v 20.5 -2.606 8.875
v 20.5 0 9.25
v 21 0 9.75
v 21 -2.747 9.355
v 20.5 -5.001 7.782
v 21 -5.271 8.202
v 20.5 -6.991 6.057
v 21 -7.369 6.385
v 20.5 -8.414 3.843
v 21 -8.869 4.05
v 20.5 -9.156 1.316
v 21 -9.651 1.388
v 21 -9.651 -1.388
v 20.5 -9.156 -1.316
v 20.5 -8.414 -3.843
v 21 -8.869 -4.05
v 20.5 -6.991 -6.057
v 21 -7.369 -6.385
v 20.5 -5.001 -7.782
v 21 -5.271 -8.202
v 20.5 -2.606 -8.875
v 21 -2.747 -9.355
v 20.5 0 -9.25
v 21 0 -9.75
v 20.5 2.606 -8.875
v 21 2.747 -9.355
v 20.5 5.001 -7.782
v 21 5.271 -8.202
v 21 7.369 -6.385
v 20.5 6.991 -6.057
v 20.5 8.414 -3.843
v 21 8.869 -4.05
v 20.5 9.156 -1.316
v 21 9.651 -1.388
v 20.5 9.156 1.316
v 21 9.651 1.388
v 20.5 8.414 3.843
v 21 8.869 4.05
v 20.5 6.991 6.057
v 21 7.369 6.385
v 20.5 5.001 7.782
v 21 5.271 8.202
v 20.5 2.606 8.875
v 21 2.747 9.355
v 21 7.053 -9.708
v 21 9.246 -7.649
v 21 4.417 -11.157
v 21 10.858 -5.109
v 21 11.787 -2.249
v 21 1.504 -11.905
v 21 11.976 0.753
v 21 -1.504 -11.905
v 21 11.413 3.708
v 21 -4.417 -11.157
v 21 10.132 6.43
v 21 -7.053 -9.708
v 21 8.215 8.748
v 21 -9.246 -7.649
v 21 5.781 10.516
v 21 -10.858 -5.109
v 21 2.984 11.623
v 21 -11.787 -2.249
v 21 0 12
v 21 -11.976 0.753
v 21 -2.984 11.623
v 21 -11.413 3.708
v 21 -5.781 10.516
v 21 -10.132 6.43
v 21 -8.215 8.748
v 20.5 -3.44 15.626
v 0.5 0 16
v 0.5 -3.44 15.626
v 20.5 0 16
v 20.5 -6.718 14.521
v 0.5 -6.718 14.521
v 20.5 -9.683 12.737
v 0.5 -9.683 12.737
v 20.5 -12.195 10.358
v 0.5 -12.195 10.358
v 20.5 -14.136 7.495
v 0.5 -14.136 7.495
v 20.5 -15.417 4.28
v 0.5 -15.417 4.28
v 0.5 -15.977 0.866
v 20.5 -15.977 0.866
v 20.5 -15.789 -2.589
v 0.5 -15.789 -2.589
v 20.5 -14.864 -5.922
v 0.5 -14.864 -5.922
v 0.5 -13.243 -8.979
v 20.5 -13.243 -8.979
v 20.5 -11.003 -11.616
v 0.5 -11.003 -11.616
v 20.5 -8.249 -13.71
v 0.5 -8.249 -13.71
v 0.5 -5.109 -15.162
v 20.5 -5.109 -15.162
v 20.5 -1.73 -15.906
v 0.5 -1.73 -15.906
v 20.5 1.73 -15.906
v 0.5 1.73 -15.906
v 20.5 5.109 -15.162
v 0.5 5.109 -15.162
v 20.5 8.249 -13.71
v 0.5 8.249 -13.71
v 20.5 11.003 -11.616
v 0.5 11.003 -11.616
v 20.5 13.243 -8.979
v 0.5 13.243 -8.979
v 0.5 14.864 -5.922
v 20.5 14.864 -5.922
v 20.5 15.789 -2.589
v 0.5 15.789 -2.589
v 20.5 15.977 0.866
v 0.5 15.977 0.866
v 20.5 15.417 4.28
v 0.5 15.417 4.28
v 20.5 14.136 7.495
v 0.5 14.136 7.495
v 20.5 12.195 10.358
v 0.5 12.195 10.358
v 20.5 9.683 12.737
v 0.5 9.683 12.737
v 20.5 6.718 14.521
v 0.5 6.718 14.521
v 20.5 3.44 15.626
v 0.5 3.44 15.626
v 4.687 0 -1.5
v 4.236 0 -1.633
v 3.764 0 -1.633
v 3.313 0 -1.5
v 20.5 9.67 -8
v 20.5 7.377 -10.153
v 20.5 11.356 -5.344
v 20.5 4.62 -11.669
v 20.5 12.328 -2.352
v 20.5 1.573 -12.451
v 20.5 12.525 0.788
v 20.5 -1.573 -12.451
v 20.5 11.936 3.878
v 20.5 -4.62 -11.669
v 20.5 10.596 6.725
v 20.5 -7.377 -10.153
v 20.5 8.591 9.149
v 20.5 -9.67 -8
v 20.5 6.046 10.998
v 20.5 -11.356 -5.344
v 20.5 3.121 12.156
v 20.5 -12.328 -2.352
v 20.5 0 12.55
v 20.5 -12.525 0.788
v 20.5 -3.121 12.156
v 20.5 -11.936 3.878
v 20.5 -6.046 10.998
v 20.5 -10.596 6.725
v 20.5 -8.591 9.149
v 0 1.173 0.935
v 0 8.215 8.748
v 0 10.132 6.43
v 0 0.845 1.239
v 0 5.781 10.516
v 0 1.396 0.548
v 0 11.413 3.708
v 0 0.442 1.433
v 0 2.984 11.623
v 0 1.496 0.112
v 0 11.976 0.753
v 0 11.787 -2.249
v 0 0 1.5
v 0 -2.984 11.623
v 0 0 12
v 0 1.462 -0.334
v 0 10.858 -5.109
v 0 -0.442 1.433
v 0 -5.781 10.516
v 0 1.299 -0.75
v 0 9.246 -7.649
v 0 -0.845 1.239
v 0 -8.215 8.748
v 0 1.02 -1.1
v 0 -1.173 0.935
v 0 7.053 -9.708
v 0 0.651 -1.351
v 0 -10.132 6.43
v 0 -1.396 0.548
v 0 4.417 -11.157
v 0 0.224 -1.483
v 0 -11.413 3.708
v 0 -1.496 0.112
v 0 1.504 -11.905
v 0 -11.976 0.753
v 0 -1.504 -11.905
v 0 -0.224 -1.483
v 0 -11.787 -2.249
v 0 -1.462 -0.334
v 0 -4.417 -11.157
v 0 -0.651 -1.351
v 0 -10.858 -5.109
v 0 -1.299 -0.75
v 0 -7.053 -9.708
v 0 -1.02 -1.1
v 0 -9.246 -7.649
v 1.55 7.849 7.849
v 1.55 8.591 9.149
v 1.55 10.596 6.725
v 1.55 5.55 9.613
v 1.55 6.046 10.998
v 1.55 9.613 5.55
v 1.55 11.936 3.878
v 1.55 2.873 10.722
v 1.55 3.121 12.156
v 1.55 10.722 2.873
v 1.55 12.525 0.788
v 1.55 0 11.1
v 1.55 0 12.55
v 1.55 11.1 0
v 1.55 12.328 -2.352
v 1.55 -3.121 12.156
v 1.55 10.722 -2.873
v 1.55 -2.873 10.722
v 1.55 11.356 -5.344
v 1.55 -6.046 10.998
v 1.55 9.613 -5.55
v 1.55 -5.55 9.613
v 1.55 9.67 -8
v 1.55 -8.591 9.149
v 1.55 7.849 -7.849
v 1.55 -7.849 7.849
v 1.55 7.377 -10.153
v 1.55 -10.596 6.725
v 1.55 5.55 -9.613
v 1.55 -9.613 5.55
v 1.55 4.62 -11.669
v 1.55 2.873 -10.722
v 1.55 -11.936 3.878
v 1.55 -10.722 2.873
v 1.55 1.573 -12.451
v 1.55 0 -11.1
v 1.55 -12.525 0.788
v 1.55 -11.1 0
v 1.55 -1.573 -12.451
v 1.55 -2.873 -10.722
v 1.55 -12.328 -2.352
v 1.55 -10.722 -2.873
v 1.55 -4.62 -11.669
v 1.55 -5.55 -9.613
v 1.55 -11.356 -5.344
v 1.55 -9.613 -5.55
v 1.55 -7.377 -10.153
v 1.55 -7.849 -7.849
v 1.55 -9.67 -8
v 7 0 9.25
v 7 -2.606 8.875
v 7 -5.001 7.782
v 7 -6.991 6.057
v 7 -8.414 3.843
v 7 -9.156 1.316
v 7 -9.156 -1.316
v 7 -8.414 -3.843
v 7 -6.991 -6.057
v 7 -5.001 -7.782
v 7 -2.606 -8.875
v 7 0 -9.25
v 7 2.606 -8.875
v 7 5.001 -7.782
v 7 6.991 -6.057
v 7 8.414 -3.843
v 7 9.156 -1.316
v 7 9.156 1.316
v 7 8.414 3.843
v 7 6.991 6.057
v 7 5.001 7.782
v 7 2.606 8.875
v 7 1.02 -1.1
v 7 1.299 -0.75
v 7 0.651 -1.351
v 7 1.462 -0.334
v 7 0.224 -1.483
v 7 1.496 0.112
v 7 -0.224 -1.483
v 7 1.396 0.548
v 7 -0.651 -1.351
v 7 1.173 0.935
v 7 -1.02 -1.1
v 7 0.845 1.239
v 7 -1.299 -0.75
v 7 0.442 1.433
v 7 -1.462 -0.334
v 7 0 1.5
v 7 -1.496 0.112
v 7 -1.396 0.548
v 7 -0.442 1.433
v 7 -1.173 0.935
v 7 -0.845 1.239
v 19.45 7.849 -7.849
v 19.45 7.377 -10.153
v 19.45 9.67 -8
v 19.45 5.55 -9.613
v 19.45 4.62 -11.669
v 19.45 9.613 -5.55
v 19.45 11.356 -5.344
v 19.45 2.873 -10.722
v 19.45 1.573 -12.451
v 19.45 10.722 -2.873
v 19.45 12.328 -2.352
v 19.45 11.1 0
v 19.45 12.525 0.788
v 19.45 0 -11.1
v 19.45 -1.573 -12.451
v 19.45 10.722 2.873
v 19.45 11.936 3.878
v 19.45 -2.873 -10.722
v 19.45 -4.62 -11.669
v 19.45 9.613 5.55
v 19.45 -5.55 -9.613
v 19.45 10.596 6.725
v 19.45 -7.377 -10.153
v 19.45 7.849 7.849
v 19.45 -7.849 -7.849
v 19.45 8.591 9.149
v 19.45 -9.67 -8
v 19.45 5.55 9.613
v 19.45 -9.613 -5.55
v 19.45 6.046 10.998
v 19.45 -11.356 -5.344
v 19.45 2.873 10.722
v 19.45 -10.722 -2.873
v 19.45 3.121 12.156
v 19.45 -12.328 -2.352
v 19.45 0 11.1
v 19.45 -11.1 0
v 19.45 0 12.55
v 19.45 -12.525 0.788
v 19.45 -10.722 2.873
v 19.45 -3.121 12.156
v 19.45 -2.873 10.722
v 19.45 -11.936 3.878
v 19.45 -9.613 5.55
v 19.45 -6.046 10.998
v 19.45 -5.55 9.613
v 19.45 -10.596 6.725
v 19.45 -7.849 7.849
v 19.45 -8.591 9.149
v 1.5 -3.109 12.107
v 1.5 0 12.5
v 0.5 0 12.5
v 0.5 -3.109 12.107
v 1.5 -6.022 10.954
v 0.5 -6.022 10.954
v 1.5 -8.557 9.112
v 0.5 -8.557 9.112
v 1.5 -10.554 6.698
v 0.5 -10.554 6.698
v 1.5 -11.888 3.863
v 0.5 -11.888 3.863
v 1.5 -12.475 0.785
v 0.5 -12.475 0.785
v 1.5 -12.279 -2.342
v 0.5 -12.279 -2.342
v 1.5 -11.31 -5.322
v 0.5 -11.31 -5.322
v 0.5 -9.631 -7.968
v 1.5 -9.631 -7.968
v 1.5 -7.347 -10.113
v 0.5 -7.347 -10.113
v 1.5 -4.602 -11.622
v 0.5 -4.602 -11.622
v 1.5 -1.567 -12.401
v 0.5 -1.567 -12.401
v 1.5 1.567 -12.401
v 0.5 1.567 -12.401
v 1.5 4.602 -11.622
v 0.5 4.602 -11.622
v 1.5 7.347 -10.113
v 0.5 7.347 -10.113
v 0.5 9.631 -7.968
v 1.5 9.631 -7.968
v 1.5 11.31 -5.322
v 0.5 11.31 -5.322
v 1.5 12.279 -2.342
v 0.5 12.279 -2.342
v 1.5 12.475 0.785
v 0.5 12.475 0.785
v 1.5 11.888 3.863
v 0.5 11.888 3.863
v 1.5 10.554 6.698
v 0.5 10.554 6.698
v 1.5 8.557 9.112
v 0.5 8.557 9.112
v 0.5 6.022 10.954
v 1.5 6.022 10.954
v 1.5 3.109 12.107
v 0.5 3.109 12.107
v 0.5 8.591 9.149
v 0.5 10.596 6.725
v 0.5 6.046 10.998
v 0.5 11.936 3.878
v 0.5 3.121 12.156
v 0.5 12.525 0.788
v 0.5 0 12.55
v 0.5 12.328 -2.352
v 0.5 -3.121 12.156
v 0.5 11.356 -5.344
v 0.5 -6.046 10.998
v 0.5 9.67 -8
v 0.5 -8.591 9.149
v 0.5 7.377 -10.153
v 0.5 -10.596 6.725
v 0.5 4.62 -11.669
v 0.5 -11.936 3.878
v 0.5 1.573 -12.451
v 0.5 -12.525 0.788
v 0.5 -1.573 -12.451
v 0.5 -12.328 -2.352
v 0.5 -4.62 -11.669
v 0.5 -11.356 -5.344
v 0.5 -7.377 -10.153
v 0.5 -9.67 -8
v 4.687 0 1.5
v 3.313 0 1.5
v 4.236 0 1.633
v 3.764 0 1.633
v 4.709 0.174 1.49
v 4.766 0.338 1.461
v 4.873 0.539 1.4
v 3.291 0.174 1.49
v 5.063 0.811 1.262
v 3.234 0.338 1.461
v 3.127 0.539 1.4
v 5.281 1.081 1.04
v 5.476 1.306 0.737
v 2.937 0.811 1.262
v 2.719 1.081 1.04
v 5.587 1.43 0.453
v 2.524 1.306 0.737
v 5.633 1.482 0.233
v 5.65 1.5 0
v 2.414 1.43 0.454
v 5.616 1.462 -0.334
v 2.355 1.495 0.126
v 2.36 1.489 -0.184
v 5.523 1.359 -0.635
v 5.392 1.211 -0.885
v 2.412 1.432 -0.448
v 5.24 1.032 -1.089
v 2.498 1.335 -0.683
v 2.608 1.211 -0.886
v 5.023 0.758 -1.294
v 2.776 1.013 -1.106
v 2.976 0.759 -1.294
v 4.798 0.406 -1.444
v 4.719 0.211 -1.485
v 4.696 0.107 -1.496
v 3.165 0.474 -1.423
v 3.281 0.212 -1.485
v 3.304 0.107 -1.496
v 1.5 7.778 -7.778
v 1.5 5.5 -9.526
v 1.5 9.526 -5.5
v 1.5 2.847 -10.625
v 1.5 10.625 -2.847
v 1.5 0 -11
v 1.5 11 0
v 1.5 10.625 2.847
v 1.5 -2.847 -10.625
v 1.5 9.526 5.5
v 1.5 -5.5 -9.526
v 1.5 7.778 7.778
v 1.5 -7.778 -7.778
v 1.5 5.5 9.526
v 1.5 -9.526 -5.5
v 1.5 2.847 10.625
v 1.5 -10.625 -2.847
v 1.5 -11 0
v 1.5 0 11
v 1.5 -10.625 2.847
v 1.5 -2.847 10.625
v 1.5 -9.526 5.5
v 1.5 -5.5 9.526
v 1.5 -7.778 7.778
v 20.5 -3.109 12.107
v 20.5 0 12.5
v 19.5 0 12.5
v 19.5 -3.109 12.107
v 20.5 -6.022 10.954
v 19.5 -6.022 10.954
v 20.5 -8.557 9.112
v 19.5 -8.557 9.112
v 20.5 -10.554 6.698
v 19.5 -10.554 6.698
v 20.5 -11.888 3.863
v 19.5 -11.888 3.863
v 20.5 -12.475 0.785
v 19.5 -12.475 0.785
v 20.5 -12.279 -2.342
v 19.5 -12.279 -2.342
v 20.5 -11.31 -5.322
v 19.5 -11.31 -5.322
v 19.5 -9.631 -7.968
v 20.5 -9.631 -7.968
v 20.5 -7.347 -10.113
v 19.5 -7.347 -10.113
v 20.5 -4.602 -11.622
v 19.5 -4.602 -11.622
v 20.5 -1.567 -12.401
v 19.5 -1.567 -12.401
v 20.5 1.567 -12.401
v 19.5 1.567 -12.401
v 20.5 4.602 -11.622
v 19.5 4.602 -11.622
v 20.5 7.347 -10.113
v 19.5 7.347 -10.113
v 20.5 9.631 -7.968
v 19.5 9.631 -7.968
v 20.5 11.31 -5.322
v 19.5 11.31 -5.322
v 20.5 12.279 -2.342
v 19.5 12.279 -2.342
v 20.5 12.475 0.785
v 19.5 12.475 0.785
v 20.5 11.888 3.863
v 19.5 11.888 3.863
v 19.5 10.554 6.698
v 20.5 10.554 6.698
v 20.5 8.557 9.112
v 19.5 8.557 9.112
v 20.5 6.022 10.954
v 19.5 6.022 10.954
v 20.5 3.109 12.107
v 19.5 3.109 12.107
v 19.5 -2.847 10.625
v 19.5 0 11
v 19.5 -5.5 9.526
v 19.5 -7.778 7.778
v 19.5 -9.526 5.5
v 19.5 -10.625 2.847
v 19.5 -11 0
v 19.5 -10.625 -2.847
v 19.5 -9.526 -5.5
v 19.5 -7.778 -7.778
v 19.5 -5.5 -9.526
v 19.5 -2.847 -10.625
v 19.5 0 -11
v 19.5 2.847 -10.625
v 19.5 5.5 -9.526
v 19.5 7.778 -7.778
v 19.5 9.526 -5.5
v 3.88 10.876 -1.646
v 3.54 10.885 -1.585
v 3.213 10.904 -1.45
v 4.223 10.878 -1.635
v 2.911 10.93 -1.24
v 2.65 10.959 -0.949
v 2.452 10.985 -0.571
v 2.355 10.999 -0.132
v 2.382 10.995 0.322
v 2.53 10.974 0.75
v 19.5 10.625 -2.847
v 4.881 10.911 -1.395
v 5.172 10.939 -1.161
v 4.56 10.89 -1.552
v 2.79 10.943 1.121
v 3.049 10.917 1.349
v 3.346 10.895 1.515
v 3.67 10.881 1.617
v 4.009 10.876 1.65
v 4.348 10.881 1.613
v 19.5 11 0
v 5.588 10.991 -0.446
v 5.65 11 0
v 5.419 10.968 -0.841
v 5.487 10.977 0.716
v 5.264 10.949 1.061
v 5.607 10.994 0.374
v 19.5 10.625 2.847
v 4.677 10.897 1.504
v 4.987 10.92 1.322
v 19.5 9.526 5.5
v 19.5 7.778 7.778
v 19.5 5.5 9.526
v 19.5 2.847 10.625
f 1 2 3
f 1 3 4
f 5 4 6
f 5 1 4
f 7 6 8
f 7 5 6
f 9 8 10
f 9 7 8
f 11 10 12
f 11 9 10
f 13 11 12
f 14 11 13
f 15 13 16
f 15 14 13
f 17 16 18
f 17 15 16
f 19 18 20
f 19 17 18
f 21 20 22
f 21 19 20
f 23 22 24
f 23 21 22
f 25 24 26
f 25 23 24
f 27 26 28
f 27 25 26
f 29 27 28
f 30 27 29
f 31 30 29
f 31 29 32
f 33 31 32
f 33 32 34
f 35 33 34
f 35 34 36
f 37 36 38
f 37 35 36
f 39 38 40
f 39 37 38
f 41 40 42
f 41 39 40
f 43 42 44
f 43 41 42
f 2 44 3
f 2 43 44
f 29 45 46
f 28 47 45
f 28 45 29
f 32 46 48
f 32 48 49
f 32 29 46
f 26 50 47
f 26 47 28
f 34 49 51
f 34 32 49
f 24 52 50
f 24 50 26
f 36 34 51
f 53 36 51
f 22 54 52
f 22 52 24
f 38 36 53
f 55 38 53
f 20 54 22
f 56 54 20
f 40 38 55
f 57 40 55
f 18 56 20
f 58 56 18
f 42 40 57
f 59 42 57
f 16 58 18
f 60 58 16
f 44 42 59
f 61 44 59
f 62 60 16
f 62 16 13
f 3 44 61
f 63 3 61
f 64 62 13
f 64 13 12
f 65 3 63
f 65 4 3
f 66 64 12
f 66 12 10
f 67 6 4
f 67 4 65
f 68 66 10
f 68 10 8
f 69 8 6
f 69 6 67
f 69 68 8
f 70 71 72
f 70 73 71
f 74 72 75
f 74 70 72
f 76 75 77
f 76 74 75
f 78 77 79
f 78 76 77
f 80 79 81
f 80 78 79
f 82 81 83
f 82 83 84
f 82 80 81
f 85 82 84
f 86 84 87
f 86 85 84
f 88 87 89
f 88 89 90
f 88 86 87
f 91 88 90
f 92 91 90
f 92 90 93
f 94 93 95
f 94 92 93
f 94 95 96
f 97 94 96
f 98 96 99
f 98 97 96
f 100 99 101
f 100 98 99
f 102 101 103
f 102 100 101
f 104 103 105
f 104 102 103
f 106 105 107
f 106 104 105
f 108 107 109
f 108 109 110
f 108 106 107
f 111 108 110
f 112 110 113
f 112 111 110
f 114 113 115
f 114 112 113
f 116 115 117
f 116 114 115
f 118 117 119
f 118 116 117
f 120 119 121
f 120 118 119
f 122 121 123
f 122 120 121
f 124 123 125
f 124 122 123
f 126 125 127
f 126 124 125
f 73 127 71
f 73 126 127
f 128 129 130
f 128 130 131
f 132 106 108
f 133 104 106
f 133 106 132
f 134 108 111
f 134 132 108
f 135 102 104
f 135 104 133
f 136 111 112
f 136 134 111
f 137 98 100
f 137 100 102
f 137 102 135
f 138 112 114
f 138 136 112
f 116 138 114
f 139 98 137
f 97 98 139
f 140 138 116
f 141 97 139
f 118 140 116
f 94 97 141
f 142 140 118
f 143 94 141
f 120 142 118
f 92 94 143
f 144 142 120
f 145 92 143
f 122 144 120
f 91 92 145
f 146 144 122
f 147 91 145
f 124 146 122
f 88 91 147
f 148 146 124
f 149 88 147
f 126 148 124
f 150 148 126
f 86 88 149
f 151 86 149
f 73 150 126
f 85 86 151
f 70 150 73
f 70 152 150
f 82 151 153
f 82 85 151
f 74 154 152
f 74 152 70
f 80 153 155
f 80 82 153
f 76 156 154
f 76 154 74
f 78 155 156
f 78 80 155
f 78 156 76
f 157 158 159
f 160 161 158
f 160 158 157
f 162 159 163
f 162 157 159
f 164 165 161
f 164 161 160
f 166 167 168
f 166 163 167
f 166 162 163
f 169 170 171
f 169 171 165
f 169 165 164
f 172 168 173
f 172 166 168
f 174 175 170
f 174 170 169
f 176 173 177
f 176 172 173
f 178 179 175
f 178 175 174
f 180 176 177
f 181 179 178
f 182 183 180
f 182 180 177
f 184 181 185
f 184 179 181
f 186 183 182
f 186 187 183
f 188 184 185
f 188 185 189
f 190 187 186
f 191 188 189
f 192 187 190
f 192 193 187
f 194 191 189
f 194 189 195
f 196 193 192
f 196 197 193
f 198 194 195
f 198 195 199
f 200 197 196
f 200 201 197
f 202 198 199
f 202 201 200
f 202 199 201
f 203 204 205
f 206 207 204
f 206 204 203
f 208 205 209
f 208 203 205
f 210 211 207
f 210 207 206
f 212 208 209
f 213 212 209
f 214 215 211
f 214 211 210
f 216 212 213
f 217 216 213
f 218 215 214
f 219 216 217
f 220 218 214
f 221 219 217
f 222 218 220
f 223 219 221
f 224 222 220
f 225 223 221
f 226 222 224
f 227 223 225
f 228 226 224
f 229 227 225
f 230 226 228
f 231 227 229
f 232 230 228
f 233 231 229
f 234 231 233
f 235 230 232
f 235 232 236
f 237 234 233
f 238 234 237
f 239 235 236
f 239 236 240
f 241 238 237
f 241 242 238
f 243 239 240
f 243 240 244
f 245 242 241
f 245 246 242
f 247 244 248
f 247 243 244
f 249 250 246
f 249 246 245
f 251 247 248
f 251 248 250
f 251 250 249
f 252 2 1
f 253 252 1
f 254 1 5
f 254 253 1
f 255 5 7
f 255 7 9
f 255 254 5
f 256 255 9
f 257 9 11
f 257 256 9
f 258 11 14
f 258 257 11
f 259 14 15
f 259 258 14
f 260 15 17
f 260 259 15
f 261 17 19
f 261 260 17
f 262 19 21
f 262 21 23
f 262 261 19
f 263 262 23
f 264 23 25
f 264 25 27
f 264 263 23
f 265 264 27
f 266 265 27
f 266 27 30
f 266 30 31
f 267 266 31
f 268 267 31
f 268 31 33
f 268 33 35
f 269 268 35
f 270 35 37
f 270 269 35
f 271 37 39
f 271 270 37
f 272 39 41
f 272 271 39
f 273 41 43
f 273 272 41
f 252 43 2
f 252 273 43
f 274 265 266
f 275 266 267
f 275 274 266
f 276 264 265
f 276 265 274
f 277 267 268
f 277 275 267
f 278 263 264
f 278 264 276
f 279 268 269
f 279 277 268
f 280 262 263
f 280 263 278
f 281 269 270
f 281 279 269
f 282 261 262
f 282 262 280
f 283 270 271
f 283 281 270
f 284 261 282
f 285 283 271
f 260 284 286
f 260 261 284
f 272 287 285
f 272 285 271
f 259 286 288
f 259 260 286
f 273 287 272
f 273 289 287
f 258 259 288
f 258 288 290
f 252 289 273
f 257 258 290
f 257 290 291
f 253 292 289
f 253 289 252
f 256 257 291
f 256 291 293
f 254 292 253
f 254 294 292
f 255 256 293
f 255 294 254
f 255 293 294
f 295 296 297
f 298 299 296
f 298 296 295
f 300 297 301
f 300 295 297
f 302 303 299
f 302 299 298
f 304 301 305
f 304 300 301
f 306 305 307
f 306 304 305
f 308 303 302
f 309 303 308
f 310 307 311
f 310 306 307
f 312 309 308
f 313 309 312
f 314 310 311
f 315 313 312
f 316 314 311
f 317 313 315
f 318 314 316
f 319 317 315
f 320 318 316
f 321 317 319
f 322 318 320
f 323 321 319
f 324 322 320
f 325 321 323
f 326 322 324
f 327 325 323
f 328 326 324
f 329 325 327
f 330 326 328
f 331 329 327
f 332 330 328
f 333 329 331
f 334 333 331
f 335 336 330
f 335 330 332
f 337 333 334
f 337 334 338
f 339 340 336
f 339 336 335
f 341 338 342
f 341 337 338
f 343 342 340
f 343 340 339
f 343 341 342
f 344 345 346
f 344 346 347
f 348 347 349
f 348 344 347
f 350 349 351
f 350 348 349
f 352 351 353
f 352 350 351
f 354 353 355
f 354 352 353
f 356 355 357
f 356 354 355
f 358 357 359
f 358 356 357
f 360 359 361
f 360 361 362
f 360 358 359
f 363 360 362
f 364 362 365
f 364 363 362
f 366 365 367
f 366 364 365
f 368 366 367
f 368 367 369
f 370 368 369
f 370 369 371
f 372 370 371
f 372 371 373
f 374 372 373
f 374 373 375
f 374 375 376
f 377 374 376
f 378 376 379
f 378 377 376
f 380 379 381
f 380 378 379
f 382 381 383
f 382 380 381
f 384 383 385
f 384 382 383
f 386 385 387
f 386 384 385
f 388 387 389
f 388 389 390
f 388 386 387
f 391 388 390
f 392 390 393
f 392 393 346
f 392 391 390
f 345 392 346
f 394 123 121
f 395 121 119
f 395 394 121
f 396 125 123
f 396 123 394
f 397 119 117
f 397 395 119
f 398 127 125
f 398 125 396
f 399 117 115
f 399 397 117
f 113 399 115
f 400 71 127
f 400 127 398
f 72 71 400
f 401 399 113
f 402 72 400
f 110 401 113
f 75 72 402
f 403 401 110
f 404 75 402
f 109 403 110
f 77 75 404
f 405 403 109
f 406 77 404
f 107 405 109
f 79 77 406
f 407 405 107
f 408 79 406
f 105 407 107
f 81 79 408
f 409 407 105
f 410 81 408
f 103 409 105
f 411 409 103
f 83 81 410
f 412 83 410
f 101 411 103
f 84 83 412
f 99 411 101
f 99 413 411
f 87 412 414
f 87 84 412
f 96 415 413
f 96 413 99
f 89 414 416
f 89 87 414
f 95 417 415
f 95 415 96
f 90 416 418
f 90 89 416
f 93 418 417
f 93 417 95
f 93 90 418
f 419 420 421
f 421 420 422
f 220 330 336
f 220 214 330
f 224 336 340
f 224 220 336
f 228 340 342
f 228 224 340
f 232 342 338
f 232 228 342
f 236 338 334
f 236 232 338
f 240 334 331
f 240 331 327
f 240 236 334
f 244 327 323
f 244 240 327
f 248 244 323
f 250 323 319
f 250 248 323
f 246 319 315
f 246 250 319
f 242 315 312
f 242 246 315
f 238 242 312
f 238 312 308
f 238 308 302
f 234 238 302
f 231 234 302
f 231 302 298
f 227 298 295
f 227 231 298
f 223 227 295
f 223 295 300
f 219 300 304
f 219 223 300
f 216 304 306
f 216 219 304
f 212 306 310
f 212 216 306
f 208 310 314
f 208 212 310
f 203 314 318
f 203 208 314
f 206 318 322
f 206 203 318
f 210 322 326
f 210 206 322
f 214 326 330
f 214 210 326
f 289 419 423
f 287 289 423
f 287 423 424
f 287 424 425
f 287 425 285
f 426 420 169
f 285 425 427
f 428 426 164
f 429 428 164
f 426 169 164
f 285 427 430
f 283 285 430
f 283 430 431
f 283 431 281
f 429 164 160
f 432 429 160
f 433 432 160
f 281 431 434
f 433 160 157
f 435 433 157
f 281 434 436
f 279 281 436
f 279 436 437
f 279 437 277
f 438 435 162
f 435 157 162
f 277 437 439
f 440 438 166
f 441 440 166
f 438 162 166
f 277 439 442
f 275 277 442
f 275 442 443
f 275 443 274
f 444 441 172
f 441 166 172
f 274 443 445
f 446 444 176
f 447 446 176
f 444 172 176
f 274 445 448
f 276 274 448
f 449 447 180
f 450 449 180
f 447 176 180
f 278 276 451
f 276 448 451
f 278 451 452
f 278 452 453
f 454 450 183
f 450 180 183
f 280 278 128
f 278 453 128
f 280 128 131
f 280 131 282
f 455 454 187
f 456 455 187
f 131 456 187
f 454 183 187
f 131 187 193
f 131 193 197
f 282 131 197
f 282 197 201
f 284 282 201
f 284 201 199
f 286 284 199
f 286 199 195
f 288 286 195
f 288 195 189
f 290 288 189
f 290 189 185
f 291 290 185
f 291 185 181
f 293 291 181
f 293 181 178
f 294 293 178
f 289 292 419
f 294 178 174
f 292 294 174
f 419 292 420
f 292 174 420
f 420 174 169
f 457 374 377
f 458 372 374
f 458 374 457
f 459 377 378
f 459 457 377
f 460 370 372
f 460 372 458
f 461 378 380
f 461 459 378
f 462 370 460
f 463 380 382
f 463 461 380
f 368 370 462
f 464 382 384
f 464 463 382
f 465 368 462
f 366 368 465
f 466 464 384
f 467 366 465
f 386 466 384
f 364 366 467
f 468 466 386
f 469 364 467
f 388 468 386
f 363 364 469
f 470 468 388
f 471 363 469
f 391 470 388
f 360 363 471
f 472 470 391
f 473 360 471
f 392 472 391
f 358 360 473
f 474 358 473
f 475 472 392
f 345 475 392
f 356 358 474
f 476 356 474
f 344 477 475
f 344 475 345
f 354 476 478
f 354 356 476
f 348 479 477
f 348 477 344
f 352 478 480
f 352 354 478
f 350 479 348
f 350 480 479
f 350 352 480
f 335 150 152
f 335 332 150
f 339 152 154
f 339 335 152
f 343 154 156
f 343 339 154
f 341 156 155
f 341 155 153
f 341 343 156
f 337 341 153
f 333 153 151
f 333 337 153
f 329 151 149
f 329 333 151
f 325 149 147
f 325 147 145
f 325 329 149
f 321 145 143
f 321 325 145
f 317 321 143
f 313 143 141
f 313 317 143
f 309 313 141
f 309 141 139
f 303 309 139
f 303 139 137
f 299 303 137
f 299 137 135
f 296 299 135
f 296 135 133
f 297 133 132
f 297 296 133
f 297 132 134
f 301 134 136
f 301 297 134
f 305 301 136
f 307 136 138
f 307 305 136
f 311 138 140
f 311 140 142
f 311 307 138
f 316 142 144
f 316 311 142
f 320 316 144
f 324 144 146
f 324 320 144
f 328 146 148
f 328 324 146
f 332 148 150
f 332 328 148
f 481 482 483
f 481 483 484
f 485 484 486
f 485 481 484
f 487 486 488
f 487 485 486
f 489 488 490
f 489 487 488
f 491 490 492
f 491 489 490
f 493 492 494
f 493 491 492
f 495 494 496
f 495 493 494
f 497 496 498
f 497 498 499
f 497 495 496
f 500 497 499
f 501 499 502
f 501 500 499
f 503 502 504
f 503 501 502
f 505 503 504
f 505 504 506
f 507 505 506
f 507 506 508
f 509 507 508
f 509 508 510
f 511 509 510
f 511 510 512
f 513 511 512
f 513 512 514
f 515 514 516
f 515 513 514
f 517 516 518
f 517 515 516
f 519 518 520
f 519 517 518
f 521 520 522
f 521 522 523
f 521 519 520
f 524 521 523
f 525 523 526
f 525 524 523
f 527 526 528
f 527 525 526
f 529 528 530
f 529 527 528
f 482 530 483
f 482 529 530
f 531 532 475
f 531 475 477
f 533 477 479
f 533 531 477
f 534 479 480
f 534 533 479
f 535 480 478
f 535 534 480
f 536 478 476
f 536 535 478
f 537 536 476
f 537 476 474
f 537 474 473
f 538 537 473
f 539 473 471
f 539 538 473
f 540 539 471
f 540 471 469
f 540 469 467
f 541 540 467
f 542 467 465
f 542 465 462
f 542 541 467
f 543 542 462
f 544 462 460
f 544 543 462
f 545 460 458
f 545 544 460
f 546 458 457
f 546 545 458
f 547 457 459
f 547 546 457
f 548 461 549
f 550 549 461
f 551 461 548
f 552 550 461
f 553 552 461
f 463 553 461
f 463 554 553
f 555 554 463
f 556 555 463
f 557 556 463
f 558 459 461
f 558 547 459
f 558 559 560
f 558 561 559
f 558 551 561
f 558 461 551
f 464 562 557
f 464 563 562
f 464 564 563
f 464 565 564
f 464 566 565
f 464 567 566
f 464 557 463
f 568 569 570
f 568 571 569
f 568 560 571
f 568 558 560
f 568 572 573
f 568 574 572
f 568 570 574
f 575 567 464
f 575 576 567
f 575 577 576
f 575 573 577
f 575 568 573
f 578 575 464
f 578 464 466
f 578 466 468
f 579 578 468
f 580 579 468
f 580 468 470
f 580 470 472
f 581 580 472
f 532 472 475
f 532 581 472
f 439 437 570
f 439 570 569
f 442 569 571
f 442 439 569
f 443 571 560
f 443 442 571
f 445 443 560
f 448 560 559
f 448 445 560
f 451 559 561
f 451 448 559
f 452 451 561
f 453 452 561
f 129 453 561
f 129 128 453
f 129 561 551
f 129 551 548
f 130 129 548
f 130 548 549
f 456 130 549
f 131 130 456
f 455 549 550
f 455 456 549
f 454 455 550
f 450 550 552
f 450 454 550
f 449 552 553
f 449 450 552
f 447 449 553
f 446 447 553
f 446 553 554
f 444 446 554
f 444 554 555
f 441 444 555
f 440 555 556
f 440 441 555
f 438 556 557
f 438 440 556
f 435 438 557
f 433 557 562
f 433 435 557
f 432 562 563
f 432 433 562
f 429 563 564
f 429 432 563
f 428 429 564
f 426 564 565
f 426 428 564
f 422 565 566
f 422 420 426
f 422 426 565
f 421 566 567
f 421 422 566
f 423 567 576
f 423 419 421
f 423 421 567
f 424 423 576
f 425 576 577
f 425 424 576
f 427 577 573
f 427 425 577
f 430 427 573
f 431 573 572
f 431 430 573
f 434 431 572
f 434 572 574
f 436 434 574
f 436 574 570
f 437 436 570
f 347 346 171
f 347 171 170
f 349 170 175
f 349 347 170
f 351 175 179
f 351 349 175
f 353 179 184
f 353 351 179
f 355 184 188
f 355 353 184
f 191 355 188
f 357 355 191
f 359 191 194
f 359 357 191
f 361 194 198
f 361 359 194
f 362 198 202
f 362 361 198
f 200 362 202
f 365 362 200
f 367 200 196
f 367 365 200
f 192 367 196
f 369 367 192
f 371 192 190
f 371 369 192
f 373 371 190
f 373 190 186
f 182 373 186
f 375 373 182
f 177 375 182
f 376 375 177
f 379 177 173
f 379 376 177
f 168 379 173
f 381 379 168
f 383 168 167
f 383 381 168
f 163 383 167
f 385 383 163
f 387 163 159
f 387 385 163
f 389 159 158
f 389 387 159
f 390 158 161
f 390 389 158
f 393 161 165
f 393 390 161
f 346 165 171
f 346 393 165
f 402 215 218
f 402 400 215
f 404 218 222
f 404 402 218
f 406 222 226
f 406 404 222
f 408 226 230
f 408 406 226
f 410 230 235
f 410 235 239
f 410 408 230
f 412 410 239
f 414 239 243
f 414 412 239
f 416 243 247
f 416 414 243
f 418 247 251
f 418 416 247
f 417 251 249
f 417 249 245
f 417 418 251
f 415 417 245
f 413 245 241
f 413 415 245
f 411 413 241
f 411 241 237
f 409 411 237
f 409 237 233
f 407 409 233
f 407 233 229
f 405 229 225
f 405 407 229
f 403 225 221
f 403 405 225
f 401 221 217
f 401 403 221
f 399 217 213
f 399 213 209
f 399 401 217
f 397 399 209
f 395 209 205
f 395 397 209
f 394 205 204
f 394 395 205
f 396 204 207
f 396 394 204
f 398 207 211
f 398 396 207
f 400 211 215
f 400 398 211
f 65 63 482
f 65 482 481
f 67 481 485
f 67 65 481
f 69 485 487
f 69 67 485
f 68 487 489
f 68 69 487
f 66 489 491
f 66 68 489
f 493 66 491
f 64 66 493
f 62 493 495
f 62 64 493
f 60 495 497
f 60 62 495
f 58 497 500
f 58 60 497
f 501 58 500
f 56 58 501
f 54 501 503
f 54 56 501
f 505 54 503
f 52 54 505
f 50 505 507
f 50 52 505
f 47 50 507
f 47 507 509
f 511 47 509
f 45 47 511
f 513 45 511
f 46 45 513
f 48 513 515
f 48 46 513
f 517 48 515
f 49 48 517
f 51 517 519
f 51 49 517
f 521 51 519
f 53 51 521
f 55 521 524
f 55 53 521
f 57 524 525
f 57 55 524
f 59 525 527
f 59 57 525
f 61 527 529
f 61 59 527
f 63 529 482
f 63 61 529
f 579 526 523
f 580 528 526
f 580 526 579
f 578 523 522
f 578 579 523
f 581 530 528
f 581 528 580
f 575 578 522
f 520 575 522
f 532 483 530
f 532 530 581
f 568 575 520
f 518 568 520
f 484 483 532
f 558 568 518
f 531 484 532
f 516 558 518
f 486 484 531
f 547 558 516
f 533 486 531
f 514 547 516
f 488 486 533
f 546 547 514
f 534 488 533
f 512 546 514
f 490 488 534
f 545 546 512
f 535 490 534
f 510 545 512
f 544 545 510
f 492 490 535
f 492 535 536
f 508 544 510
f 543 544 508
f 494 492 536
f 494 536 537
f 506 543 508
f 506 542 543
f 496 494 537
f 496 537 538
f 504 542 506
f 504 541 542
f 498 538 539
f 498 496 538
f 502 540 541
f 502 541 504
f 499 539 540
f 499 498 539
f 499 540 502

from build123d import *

# Parameters (mm, degrees)
CORTE_EXTRUS_O1_REACH         = 29.45
ESBO_O3_R                     = 1.5
FURO_ROSCADO_DE_M41_OUTLINE_R = 1.65
FURO_ROSCADO_DE_M41_DEPTH     = 11.000000058
CHANFRO1_SIZE                 = 0.5


# Read off the part's stored shape, not the designer's step: Furo roscado de M41
with BuildPart() as part:
    # Esboço2 → Revolução1 (revolve)
    with BuildSketch(Plane.XY, mode=Mode.PRIVATE) as revolu_o1_sk:
        Polygon((0, 0), (0, 12.5), (1.5, 12.5), (1.5, 11), (19.5, 11), (19.5, 12.5), (21, 12.5), (21, 9.25), (7, 9.25), (7, 0), align=None)
    revolve(revolu_o1_sk.sketch.rotate(Axis((0, 0, 0), (1, 0, 0)), 90), axis=Axis((0, 0, 0), (1, 0, 0)))

    # Esboço3 → Corte-extrusão1 (cut, up to next)
    with BuildSketch(Plane.ZY, mode=Mode.PRIVATE) as corte_extrus_o1_sk1:
        Circle(ESBO_O3_R)
    corte_extrus_o1_tool1 = extrude(corte_extrus_o1_sk1.sketch, amount=-CORTE_EXTRUS_O1_REACH, mode=Mode.PRIVATE) & part.part
    add(corte_extrus_o1_tool1.solids().sort_by_distance((0, 0, 0))[0], mode=Mode.SUBTRACT)

    # Furo roscado de M41 outline → Furo roscado de M41 (cut)
    with BuildSketch(Plane(origin=(0, 0, 0), x_dir=(1, 0, 0), z_dir=(0, 1, 0))):
        with Locations((4, 0)):
            Circle(FURO_ROSCADO_DE_M41_OUTLINE_R)
    extrude(amount=FURO_ROSCADO_DE_M41_DEPTH, mode=Mode.SUBTRACT)

    # Chanfro1
    chanfro1_edges = [part.edges().sort_by_distance(p)[0] for p in [
        (0, 0, -12.5),
        (21, 0, -9.25),
        (21, 0, -12.5),
    ]]
    chamfer(chanfro1_edges, length=CHANFRO1_SIZE)


with BuildPart() as body_2:
    # Esboço6 → Revolução2 (revolve)
    with BuildSketch(Plane.XY, mode=Mode.PRIVATE) as revolu_o2_sk:
        Polygon((1.55, 11.1), (1.55, 12.55), (0.5, 12.55), (0.5, 16), (20.5, 16), (20.5, 12.55), (19.45, 12.55), (19.45, 11.1), align=None)
    revolve(revolu_o2_sk.sketch.rotate(Axis((0, 0, 0), (1, 0, 0)), 90), axis=Axis((0, 0, 0), (1, 0, 0)))


solid = Compound([part.part, body_2.part])
